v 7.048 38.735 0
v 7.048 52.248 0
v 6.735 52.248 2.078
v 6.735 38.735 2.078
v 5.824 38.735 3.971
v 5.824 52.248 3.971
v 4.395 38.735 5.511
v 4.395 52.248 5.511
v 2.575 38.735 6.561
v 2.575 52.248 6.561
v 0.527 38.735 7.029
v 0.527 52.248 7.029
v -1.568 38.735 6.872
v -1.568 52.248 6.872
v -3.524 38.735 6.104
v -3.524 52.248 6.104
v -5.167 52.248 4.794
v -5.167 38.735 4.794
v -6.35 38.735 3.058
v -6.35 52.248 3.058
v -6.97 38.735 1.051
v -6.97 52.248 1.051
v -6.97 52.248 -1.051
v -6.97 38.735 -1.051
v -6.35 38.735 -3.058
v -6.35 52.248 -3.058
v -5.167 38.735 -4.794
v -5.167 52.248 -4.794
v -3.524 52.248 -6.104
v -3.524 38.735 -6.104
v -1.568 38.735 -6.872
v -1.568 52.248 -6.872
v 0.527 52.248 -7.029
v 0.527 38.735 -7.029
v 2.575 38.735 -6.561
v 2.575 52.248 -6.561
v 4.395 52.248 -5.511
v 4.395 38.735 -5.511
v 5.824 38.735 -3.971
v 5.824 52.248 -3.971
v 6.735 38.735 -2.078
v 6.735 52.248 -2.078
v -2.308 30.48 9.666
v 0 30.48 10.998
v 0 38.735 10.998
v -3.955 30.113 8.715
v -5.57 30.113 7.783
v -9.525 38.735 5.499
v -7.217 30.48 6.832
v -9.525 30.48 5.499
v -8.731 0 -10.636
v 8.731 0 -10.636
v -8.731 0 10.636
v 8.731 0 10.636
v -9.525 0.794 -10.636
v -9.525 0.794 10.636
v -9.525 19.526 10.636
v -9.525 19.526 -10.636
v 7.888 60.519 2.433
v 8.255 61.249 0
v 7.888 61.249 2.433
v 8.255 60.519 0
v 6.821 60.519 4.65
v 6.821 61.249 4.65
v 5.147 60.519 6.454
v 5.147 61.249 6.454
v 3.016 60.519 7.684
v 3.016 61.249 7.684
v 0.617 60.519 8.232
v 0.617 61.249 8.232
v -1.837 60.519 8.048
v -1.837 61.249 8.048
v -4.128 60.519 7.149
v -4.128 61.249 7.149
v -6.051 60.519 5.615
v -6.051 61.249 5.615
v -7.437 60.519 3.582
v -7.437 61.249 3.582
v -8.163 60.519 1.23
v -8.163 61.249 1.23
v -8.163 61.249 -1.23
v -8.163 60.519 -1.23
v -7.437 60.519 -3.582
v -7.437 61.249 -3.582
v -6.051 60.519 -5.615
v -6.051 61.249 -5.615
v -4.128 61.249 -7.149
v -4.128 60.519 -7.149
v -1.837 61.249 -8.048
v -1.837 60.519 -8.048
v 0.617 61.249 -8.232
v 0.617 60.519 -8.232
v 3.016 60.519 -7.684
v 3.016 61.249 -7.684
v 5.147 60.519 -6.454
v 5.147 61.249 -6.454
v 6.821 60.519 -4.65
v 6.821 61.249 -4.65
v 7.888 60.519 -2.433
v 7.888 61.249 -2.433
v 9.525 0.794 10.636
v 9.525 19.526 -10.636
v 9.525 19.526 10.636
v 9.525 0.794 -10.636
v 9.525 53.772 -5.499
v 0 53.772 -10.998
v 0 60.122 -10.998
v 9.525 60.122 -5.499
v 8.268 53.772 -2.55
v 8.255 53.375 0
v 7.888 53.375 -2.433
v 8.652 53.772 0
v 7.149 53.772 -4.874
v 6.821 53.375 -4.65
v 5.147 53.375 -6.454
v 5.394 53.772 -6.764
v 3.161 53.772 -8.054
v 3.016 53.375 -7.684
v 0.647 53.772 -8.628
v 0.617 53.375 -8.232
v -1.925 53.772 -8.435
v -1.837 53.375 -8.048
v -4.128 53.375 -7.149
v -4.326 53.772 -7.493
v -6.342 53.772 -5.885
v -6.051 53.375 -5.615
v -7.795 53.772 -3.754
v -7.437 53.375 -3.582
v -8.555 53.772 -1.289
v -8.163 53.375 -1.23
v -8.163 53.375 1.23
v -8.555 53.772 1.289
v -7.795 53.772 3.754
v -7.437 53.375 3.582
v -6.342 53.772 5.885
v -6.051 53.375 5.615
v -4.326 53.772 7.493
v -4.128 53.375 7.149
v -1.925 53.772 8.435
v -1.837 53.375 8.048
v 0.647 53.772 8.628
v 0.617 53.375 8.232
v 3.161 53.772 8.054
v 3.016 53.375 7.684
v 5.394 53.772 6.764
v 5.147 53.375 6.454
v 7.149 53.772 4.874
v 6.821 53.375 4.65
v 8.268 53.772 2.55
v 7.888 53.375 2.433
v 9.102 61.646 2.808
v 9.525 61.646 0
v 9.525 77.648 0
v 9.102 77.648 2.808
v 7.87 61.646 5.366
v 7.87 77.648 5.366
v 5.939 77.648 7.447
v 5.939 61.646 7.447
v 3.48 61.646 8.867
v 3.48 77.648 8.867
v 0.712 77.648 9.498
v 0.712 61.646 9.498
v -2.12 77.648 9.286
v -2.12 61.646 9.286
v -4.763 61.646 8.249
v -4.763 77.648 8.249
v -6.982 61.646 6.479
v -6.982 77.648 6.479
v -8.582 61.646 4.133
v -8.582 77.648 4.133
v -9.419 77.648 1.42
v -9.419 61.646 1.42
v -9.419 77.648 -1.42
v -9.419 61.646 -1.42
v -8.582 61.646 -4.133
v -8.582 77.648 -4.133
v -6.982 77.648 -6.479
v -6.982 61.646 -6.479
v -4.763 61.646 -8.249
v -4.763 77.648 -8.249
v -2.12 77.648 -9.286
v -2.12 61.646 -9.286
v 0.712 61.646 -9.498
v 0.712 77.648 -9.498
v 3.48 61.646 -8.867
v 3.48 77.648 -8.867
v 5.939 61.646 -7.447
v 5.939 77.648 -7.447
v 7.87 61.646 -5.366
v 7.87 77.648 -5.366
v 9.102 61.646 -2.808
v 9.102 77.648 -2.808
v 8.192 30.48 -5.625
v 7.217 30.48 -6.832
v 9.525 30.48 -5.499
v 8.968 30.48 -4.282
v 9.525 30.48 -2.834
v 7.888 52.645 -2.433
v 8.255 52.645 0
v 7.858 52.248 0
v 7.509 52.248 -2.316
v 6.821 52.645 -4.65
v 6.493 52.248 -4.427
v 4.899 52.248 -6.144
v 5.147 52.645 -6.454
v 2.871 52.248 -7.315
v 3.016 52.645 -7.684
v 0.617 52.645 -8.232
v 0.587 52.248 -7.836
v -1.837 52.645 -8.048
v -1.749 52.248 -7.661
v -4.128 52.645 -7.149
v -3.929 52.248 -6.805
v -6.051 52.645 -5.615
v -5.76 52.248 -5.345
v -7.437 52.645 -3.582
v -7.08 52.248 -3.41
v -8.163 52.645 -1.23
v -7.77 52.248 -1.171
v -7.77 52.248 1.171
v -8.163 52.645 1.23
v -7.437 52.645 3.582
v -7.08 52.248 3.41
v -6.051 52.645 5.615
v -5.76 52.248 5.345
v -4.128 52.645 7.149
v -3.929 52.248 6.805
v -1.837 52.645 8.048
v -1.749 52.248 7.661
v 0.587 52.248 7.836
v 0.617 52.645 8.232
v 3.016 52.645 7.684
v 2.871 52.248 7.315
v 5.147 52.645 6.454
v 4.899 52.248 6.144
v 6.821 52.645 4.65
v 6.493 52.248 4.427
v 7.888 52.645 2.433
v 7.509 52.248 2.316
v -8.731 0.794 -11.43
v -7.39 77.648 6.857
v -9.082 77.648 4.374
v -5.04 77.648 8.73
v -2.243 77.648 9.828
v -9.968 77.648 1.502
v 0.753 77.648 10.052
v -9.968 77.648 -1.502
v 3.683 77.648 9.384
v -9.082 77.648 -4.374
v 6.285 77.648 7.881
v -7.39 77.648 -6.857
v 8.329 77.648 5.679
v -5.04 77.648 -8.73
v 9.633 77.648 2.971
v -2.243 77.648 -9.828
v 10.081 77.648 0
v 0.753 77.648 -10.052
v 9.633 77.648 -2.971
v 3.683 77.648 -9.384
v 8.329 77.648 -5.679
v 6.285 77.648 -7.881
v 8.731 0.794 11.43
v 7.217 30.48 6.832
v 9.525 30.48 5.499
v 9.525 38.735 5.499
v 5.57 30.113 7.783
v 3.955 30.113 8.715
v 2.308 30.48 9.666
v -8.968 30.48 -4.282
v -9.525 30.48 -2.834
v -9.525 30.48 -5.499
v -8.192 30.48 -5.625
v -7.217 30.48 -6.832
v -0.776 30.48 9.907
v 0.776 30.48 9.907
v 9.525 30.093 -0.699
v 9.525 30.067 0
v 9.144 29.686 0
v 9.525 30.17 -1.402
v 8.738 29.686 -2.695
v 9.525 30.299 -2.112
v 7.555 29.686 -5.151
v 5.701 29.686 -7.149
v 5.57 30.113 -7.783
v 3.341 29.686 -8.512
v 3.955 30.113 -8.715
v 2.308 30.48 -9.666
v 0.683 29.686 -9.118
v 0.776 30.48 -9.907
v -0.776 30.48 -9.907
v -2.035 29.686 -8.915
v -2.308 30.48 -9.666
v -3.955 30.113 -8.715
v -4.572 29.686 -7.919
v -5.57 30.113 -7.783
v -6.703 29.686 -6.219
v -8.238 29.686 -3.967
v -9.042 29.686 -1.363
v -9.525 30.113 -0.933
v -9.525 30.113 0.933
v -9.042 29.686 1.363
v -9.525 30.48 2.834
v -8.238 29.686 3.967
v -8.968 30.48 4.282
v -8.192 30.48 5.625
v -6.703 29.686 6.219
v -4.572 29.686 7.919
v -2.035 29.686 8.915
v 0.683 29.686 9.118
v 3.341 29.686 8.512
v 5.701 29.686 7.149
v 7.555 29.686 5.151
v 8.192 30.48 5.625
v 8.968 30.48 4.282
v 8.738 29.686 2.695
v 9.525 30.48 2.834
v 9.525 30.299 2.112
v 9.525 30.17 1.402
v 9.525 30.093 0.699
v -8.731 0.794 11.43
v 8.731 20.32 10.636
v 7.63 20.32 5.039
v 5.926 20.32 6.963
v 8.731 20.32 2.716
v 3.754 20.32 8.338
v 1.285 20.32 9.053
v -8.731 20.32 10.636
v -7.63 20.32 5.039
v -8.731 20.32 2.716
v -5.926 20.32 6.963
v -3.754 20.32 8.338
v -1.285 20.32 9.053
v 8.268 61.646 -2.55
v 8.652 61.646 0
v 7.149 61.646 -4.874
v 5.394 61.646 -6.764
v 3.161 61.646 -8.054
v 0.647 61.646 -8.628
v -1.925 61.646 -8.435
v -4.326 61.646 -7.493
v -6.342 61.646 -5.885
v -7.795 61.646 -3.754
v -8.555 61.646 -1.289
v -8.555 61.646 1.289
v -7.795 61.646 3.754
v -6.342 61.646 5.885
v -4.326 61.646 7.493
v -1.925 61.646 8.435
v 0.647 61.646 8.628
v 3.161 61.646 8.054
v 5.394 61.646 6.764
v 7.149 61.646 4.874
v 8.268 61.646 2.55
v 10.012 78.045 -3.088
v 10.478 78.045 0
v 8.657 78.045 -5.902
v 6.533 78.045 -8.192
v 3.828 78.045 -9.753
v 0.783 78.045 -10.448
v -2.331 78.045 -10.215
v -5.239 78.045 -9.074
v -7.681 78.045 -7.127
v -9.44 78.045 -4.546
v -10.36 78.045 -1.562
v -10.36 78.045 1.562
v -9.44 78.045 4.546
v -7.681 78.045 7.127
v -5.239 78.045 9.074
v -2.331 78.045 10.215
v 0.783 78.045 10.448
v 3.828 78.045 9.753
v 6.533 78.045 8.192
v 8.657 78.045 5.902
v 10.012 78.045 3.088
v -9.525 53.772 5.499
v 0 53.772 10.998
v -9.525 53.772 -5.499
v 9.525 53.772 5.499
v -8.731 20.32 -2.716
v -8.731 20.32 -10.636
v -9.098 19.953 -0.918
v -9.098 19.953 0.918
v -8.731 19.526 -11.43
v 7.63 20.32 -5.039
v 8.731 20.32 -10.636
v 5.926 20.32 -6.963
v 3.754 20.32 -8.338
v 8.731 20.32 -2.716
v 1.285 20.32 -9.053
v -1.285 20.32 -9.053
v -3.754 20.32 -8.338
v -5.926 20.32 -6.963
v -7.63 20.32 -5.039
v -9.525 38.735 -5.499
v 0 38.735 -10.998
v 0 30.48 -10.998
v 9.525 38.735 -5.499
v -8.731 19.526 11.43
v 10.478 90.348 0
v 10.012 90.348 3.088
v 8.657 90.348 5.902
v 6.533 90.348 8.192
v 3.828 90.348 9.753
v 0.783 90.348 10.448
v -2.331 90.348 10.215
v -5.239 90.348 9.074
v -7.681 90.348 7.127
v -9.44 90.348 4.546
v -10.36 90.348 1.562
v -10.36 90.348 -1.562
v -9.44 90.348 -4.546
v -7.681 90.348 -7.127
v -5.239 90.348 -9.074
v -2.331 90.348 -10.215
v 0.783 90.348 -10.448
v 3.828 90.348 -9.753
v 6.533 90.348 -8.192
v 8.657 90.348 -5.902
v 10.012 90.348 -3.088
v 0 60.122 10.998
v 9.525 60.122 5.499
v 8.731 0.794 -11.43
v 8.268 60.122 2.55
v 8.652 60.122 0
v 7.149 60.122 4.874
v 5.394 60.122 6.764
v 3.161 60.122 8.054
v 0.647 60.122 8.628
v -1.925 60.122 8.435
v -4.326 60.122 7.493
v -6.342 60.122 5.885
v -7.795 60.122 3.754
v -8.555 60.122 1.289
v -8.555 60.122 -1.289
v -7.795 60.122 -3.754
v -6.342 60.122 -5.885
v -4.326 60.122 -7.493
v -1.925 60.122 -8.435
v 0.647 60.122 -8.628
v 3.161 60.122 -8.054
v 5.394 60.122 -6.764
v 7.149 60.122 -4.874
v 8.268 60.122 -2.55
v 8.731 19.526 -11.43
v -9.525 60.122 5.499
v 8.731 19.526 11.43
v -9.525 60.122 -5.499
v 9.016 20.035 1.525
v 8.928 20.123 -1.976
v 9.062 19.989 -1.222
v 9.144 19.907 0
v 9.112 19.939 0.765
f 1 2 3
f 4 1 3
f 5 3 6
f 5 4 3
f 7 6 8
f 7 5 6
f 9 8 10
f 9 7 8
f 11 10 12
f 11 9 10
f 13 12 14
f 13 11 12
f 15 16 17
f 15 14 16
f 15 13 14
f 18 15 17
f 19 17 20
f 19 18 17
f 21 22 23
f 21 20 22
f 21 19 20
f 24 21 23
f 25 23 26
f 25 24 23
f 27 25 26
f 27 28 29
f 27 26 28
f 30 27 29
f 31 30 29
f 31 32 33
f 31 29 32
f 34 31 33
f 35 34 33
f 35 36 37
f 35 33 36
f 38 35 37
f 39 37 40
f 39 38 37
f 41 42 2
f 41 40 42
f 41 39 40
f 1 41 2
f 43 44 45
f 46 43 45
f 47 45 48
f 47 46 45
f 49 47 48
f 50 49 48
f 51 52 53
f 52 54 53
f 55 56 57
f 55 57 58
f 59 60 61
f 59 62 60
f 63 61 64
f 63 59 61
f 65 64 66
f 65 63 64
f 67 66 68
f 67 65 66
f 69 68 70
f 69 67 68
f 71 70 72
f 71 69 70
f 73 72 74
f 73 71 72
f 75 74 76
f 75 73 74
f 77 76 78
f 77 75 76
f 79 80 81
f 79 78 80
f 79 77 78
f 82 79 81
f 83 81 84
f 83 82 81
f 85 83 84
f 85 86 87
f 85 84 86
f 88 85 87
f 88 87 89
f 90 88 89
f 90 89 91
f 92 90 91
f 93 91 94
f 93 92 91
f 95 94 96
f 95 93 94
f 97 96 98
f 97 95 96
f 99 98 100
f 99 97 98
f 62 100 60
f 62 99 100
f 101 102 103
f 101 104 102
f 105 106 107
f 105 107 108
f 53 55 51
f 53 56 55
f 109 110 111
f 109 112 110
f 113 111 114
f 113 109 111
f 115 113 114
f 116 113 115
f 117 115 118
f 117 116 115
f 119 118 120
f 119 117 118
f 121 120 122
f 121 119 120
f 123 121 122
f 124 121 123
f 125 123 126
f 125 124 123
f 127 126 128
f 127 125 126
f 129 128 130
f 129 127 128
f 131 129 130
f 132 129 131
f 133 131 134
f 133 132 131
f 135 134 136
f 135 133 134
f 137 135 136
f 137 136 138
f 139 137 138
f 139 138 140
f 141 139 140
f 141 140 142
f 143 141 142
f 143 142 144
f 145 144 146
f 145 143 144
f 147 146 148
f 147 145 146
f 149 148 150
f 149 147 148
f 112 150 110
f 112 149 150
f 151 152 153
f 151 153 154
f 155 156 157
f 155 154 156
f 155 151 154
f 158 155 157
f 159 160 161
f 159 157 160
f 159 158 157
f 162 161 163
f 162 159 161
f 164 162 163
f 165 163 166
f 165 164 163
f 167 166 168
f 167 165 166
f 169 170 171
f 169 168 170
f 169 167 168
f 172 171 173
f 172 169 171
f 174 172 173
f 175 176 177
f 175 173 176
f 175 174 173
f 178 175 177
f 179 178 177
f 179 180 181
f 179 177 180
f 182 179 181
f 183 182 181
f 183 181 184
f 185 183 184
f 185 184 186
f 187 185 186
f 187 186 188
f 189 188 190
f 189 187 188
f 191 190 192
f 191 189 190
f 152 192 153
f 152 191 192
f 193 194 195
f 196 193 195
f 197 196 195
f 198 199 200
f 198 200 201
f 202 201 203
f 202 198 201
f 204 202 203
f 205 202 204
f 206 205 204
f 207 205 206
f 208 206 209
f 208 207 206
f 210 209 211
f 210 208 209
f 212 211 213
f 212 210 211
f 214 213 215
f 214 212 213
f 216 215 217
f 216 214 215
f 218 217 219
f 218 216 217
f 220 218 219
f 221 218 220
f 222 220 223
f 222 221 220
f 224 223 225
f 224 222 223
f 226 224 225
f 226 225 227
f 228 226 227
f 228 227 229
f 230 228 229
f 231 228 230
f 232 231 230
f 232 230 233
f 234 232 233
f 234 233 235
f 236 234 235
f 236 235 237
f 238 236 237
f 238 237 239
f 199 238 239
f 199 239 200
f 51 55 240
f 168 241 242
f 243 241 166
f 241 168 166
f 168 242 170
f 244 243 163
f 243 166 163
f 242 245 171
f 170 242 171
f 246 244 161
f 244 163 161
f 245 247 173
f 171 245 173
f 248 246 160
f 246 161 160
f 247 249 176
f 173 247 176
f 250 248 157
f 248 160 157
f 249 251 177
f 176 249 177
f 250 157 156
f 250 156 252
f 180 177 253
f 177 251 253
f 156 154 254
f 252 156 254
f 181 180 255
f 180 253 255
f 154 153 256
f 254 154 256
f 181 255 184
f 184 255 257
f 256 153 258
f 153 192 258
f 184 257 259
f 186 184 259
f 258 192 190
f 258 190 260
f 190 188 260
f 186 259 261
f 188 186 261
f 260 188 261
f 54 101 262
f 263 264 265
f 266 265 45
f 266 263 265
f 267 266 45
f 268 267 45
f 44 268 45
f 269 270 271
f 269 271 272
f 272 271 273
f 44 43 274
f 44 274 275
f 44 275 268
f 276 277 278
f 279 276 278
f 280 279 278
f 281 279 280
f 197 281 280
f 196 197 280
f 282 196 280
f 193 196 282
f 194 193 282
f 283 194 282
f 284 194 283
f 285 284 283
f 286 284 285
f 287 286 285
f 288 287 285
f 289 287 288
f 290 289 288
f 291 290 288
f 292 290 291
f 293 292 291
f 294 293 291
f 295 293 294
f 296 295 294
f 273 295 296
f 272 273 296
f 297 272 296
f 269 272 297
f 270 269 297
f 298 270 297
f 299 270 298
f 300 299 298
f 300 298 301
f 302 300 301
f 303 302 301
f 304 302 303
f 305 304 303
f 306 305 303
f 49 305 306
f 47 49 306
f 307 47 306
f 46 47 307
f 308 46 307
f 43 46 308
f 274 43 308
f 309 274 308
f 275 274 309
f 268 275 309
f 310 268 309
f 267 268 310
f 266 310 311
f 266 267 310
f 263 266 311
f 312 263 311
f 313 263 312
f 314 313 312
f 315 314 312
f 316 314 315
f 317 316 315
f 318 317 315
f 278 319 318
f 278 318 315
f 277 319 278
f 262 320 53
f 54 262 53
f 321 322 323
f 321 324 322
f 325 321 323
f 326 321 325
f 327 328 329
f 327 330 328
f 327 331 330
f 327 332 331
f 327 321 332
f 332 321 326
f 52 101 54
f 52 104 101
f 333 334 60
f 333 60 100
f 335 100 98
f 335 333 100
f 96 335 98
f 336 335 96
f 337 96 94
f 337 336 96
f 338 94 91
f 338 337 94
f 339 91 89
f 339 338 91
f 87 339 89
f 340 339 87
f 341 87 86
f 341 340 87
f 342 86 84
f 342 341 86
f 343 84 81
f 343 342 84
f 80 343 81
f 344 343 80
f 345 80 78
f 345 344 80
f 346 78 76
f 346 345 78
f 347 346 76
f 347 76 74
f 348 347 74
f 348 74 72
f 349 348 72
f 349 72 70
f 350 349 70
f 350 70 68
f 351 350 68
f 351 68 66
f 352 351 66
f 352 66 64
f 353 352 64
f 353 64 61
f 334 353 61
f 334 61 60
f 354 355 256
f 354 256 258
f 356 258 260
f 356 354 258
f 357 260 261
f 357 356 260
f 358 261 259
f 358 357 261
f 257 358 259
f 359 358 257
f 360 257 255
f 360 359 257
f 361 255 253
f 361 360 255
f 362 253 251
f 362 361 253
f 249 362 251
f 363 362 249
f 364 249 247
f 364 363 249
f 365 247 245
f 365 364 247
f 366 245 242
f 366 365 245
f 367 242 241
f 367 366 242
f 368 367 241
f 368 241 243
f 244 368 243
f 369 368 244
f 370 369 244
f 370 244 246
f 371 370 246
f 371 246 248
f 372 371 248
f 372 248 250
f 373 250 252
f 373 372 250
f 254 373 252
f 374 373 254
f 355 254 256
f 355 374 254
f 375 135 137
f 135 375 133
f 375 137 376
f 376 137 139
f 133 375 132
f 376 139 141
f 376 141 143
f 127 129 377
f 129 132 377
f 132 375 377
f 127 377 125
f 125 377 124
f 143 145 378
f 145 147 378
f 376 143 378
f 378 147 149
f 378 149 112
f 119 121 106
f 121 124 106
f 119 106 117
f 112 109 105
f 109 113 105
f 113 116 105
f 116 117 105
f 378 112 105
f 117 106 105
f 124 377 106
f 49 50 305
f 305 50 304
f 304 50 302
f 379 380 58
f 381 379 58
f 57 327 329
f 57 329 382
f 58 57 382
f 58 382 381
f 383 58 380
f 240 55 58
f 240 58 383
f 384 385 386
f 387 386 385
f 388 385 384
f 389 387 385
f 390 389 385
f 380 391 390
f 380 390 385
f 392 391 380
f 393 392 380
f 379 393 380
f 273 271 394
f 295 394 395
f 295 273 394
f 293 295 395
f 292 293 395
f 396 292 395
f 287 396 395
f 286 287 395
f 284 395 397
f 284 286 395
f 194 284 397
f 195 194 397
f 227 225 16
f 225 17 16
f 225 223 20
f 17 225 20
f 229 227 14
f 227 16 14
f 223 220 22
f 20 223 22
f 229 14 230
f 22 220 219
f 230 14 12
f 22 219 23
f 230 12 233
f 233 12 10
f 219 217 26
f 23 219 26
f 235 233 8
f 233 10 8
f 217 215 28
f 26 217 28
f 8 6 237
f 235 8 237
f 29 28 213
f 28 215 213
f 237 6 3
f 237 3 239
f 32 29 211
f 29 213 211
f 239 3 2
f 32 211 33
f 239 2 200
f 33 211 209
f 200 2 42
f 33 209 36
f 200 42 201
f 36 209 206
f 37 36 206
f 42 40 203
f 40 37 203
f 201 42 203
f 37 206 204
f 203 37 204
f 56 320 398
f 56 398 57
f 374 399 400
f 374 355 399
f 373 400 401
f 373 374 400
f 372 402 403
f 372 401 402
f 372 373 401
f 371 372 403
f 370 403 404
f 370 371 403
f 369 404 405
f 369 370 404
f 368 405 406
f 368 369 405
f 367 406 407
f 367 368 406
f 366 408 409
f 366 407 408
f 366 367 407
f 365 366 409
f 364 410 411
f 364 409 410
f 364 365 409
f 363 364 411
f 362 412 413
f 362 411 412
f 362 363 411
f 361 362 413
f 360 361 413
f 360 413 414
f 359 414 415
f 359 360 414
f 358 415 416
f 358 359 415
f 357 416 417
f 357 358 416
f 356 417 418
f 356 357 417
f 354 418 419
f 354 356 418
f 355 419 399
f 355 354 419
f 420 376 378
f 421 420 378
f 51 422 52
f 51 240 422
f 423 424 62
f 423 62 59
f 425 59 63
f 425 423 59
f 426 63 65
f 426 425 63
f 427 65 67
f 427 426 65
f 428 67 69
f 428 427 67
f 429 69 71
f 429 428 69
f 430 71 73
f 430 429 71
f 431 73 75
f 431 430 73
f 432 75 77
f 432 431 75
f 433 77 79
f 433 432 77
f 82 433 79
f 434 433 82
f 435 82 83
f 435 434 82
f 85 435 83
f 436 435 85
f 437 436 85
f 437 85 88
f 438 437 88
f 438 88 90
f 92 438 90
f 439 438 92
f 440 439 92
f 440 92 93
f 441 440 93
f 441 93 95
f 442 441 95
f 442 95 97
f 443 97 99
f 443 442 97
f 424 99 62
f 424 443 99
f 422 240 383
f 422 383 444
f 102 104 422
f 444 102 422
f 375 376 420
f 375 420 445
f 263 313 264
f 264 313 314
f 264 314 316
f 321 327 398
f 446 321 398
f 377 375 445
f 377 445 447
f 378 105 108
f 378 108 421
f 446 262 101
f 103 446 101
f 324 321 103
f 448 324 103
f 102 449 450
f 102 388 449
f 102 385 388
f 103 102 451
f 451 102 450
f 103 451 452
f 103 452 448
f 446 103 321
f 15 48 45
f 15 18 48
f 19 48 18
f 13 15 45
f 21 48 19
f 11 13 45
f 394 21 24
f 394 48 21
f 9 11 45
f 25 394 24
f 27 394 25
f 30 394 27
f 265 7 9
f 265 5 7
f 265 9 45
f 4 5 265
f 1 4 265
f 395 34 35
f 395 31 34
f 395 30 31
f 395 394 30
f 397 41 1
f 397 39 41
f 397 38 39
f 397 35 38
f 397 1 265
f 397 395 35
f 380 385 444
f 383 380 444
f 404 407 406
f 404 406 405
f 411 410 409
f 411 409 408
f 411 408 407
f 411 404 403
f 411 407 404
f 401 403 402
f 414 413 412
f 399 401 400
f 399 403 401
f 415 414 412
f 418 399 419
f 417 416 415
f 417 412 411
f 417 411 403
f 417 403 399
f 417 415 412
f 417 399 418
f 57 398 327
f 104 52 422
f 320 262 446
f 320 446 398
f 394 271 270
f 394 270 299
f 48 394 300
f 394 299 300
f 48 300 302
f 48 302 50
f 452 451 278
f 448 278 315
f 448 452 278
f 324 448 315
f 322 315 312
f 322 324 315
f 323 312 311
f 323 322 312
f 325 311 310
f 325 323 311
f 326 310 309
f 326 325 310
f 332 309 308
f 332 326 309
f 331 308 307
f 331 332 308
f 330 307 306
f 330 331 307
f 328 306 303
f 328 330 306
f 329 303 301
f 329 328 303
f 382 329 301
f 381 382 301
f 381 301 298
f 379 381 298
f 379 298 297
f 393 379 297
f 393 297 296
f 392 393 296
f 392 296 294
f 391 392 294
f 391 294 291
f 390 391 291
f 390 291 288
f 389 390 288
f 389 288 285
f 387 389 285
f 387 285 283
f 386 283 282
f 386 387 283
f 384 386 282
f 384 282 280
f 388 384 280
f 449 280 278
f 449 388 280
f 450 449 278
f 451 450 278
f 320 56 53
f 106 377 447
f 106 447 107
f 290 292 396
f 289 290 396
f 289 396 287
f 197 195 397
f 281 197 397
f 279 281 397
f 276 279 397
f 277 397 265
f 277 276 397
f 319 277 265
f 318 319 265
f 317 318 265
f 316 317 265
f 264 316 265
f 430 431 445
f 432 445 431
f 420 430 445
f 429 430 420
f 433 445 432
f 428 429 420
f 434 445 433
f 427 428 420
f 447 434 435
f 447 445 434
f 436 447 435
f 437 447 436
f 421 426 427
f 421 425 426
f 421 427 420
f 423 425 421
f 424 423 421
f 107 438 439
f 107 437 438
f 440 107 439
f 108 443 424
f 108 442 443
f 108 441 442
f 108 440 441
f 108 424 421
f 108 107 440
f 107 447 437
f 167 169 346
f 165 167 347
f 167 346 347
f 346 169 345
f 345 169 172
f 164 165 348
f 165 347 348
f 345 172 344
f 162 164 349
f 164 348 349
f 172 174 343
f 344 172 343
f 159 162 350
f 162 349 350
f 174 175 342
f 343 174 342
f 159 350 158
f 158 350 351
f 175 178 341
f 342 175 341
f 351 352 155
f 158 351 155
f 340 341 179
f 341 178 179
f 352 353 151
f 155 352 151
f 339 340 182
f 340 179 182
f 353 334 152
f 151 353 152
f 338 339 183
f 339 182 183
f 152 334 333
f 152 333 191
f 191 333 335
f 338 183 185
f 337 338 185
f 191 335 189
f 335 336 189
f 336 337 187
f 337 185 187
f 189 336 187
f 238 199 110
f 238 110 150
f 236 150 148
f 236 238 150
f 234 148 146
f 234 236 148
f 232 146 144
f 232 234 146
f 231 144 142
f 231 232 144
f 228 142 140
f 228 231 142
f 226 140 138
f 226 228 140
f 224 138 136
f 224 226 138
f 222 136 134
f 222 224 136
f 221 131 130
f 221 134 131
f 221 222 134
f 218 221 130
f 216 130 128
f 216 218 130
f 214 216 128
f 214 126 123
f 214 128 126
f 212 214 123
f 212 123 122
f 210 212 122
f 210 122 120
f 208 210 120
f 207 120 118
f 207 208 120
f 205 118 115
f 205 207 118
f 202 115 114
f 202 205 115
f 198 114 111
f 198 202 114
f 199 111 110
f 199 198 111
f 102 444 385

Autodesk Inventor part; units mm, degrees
ref_plane "YZ Plane" through (0, 0, 0) normal (1, 0, 0) x (0, 1, 0)
ref_plane "XZ Plane" through (0, 0, 0) normal (0, 1, 0) x (-1, 0, 0)
ref_plane "XY Plane" through (0, 0, 0) normal (0, 0, 1) x (1, 0, 0)
sketch "Sketch1" plane through (0, 0, 0) normal (0, 1, 0) x (-1, 0, 0)
  line L0 (-9.525, 11.43) -> (9.525, 11.43)
  line L1 (9.525, 11.43) -> (9.525, -11.43)
  line L2 (9.525, -11.43) -> (-9.525, -11.43)
  line L3 (-9.525, -11.43) -> (-9.525, 11.43)
  line L4 (-9.525, 11.43) -> (9.525, -11.43) construction
  line L5 (9.525, 11.43) -> (-9.525, -11.43) construction
  point P0 (0, 0)
  dimension "d0" = 19.05
  dimension "d1" = 22.86
extrude "Extrusion1" add sketch "Sketch1" along normal blind 20.32
sketch "Sketch2" plane through (0, 20.32, 0) normal (0, 1, 0) x (1, 0, 0)
  circle A0 centre (0, 0) radius 9.144
  dimension "d4" = 18.288
extrude "Extrusion2" add sketch "Sketch2" along normal blind 10.16
sketch "Sketch3" plane through (0, 30.48, 0) normal (0, 1, 0) x (1, 0, 0)
  line L0 (-9.525, 11.43) -> (-9.525, -11.43) projected
  line L1 (-9.525, 5.4993) -> (0, 10.9985)
  line L2 (0, 10.9985) -> (9.525, 5.4993)
  line L3 (9.525, 5.4993) -> (9.525, -5.4993)
  line L4 (9.525, -5.4993) -> (0, -10.9985)
  line L5 (0, -10.9985) -> (-9.525, -5.4993)
  line L6 (-9.525, -5.4993) -> (-9.525, 5.4993)
  point P0 (0, 0)
  point P1 (0, 0)
  point P2 (-9.525, 0)
extrude "Extrusion3" add sketch "Sketch3" along normal blind 8.255
chamfer "Chamfer1" distance 0.7937 angle 45 13 edges at (9.525, 10.16, 11.43) (-9.525, 10.16, 11.43) (9.525, 10.16, -11.43) (-9.525, 10.16, -11.43) (0, 0, -11.43) (9.525, 0, 0) (0, 0, 11.43) (-9.525, 0, 0) (9.525, 20.32, 0) (0, 20.32, 11.43) (-9.525, 20.32, 0) (0, 20.32, -11.43) (-9.144, 30.48, 0)
sketch "Sketch4" plane through (0, 38.735, 0) normal (0, 1, 0) x (1, 0, 0)
  circle A0 centre (0, 0) radius 7.0485
  dimension "d12" = 14.097
extrude "Extrusion4" add sketch "Sketch4" along normal blind 13.5128
sketch "Sketch5" plane through (0, 52.2478, 0) normal (0, 1, 0) x (1, 0, 0)
  circle A0 centre (0, 0) radius 8.255
  dimension "d15" = 16.51
extrude "Extrusion5" add sketch "Sketch5" along normal blind 1.524
sketch "Sketch6" plane through (0, 53.7718, 0) normal (0, 1, 0) x (1, 0, 0)
  line L0 (0, -10.9985) -> (9.525, -5.4993) projected
  line L1 (0, -10.9985) -> (-9.525, -5.4993)
  line L2 (-9.525, -5.4993) -> (-9.525, 5.4993)
  line L3 (-9.525, 5.4993) -> (0, 10.9985)
  line L4 (0, 10.9985) -> (9.525, 5.4993)
  line L5 (9.525, 5.4993) -> (9.525, -5.4993)
  line L6 (9.525, -5.4993) -> (0, -10.9985)
  point P0 (0, 0)
  point P1 (0, 0)
extrude "Extrusion6" add sketch "Sketch6" along normal blind 6.35
sketch "Sketch7" plane through (0, 60.1218, 0) normal (0, 1, 0) x (1, 0, 0)
  circle A0 centre (0, 0) radius 8.255
  dimension "d20" = 16.51
extrude "Extrusion7" add sketch "Sketch7" along normal blind 1.524
sketch "Sketch8" plane through (0, 61.6458, 0) normal (0, 1, 0) x (1, 0, 0)
  circle A0 centre (0, 0) radius 9.525
  dimension "d23" = 19.05
extrude "Extrusion8" add sketch "Sketch8" along normal blind 16.002
sketch "Sketch9" plane through (0, 77.6478, 0) normal (0, 1, 0) x (1, 0, 0)
  circle A0 centre (0, 0) radius 10.4775
  dimension "d26" = 20.955
extrude "Extrusion9" add sketch "Sketch9" along normal blind 12.7
thread "Thread1" size "9/16-12 UNC" class "2A" standard "ANSI Unified Screw Threads" full length
chamfer "Chamfer2" distance 0.3969 angle 45 4 edges at (-8.255, 52.2478, 0) (-8.255, 53.7718, 0) (-8.255, 60.1218, 0) (-8.255, 61.6458, 0)
chamfer "Chamfer3" distance 0.3969 angle 45 1 edges at (-10.4775, 77.6478, 0)
properties part number "NeedleValveCAD"
